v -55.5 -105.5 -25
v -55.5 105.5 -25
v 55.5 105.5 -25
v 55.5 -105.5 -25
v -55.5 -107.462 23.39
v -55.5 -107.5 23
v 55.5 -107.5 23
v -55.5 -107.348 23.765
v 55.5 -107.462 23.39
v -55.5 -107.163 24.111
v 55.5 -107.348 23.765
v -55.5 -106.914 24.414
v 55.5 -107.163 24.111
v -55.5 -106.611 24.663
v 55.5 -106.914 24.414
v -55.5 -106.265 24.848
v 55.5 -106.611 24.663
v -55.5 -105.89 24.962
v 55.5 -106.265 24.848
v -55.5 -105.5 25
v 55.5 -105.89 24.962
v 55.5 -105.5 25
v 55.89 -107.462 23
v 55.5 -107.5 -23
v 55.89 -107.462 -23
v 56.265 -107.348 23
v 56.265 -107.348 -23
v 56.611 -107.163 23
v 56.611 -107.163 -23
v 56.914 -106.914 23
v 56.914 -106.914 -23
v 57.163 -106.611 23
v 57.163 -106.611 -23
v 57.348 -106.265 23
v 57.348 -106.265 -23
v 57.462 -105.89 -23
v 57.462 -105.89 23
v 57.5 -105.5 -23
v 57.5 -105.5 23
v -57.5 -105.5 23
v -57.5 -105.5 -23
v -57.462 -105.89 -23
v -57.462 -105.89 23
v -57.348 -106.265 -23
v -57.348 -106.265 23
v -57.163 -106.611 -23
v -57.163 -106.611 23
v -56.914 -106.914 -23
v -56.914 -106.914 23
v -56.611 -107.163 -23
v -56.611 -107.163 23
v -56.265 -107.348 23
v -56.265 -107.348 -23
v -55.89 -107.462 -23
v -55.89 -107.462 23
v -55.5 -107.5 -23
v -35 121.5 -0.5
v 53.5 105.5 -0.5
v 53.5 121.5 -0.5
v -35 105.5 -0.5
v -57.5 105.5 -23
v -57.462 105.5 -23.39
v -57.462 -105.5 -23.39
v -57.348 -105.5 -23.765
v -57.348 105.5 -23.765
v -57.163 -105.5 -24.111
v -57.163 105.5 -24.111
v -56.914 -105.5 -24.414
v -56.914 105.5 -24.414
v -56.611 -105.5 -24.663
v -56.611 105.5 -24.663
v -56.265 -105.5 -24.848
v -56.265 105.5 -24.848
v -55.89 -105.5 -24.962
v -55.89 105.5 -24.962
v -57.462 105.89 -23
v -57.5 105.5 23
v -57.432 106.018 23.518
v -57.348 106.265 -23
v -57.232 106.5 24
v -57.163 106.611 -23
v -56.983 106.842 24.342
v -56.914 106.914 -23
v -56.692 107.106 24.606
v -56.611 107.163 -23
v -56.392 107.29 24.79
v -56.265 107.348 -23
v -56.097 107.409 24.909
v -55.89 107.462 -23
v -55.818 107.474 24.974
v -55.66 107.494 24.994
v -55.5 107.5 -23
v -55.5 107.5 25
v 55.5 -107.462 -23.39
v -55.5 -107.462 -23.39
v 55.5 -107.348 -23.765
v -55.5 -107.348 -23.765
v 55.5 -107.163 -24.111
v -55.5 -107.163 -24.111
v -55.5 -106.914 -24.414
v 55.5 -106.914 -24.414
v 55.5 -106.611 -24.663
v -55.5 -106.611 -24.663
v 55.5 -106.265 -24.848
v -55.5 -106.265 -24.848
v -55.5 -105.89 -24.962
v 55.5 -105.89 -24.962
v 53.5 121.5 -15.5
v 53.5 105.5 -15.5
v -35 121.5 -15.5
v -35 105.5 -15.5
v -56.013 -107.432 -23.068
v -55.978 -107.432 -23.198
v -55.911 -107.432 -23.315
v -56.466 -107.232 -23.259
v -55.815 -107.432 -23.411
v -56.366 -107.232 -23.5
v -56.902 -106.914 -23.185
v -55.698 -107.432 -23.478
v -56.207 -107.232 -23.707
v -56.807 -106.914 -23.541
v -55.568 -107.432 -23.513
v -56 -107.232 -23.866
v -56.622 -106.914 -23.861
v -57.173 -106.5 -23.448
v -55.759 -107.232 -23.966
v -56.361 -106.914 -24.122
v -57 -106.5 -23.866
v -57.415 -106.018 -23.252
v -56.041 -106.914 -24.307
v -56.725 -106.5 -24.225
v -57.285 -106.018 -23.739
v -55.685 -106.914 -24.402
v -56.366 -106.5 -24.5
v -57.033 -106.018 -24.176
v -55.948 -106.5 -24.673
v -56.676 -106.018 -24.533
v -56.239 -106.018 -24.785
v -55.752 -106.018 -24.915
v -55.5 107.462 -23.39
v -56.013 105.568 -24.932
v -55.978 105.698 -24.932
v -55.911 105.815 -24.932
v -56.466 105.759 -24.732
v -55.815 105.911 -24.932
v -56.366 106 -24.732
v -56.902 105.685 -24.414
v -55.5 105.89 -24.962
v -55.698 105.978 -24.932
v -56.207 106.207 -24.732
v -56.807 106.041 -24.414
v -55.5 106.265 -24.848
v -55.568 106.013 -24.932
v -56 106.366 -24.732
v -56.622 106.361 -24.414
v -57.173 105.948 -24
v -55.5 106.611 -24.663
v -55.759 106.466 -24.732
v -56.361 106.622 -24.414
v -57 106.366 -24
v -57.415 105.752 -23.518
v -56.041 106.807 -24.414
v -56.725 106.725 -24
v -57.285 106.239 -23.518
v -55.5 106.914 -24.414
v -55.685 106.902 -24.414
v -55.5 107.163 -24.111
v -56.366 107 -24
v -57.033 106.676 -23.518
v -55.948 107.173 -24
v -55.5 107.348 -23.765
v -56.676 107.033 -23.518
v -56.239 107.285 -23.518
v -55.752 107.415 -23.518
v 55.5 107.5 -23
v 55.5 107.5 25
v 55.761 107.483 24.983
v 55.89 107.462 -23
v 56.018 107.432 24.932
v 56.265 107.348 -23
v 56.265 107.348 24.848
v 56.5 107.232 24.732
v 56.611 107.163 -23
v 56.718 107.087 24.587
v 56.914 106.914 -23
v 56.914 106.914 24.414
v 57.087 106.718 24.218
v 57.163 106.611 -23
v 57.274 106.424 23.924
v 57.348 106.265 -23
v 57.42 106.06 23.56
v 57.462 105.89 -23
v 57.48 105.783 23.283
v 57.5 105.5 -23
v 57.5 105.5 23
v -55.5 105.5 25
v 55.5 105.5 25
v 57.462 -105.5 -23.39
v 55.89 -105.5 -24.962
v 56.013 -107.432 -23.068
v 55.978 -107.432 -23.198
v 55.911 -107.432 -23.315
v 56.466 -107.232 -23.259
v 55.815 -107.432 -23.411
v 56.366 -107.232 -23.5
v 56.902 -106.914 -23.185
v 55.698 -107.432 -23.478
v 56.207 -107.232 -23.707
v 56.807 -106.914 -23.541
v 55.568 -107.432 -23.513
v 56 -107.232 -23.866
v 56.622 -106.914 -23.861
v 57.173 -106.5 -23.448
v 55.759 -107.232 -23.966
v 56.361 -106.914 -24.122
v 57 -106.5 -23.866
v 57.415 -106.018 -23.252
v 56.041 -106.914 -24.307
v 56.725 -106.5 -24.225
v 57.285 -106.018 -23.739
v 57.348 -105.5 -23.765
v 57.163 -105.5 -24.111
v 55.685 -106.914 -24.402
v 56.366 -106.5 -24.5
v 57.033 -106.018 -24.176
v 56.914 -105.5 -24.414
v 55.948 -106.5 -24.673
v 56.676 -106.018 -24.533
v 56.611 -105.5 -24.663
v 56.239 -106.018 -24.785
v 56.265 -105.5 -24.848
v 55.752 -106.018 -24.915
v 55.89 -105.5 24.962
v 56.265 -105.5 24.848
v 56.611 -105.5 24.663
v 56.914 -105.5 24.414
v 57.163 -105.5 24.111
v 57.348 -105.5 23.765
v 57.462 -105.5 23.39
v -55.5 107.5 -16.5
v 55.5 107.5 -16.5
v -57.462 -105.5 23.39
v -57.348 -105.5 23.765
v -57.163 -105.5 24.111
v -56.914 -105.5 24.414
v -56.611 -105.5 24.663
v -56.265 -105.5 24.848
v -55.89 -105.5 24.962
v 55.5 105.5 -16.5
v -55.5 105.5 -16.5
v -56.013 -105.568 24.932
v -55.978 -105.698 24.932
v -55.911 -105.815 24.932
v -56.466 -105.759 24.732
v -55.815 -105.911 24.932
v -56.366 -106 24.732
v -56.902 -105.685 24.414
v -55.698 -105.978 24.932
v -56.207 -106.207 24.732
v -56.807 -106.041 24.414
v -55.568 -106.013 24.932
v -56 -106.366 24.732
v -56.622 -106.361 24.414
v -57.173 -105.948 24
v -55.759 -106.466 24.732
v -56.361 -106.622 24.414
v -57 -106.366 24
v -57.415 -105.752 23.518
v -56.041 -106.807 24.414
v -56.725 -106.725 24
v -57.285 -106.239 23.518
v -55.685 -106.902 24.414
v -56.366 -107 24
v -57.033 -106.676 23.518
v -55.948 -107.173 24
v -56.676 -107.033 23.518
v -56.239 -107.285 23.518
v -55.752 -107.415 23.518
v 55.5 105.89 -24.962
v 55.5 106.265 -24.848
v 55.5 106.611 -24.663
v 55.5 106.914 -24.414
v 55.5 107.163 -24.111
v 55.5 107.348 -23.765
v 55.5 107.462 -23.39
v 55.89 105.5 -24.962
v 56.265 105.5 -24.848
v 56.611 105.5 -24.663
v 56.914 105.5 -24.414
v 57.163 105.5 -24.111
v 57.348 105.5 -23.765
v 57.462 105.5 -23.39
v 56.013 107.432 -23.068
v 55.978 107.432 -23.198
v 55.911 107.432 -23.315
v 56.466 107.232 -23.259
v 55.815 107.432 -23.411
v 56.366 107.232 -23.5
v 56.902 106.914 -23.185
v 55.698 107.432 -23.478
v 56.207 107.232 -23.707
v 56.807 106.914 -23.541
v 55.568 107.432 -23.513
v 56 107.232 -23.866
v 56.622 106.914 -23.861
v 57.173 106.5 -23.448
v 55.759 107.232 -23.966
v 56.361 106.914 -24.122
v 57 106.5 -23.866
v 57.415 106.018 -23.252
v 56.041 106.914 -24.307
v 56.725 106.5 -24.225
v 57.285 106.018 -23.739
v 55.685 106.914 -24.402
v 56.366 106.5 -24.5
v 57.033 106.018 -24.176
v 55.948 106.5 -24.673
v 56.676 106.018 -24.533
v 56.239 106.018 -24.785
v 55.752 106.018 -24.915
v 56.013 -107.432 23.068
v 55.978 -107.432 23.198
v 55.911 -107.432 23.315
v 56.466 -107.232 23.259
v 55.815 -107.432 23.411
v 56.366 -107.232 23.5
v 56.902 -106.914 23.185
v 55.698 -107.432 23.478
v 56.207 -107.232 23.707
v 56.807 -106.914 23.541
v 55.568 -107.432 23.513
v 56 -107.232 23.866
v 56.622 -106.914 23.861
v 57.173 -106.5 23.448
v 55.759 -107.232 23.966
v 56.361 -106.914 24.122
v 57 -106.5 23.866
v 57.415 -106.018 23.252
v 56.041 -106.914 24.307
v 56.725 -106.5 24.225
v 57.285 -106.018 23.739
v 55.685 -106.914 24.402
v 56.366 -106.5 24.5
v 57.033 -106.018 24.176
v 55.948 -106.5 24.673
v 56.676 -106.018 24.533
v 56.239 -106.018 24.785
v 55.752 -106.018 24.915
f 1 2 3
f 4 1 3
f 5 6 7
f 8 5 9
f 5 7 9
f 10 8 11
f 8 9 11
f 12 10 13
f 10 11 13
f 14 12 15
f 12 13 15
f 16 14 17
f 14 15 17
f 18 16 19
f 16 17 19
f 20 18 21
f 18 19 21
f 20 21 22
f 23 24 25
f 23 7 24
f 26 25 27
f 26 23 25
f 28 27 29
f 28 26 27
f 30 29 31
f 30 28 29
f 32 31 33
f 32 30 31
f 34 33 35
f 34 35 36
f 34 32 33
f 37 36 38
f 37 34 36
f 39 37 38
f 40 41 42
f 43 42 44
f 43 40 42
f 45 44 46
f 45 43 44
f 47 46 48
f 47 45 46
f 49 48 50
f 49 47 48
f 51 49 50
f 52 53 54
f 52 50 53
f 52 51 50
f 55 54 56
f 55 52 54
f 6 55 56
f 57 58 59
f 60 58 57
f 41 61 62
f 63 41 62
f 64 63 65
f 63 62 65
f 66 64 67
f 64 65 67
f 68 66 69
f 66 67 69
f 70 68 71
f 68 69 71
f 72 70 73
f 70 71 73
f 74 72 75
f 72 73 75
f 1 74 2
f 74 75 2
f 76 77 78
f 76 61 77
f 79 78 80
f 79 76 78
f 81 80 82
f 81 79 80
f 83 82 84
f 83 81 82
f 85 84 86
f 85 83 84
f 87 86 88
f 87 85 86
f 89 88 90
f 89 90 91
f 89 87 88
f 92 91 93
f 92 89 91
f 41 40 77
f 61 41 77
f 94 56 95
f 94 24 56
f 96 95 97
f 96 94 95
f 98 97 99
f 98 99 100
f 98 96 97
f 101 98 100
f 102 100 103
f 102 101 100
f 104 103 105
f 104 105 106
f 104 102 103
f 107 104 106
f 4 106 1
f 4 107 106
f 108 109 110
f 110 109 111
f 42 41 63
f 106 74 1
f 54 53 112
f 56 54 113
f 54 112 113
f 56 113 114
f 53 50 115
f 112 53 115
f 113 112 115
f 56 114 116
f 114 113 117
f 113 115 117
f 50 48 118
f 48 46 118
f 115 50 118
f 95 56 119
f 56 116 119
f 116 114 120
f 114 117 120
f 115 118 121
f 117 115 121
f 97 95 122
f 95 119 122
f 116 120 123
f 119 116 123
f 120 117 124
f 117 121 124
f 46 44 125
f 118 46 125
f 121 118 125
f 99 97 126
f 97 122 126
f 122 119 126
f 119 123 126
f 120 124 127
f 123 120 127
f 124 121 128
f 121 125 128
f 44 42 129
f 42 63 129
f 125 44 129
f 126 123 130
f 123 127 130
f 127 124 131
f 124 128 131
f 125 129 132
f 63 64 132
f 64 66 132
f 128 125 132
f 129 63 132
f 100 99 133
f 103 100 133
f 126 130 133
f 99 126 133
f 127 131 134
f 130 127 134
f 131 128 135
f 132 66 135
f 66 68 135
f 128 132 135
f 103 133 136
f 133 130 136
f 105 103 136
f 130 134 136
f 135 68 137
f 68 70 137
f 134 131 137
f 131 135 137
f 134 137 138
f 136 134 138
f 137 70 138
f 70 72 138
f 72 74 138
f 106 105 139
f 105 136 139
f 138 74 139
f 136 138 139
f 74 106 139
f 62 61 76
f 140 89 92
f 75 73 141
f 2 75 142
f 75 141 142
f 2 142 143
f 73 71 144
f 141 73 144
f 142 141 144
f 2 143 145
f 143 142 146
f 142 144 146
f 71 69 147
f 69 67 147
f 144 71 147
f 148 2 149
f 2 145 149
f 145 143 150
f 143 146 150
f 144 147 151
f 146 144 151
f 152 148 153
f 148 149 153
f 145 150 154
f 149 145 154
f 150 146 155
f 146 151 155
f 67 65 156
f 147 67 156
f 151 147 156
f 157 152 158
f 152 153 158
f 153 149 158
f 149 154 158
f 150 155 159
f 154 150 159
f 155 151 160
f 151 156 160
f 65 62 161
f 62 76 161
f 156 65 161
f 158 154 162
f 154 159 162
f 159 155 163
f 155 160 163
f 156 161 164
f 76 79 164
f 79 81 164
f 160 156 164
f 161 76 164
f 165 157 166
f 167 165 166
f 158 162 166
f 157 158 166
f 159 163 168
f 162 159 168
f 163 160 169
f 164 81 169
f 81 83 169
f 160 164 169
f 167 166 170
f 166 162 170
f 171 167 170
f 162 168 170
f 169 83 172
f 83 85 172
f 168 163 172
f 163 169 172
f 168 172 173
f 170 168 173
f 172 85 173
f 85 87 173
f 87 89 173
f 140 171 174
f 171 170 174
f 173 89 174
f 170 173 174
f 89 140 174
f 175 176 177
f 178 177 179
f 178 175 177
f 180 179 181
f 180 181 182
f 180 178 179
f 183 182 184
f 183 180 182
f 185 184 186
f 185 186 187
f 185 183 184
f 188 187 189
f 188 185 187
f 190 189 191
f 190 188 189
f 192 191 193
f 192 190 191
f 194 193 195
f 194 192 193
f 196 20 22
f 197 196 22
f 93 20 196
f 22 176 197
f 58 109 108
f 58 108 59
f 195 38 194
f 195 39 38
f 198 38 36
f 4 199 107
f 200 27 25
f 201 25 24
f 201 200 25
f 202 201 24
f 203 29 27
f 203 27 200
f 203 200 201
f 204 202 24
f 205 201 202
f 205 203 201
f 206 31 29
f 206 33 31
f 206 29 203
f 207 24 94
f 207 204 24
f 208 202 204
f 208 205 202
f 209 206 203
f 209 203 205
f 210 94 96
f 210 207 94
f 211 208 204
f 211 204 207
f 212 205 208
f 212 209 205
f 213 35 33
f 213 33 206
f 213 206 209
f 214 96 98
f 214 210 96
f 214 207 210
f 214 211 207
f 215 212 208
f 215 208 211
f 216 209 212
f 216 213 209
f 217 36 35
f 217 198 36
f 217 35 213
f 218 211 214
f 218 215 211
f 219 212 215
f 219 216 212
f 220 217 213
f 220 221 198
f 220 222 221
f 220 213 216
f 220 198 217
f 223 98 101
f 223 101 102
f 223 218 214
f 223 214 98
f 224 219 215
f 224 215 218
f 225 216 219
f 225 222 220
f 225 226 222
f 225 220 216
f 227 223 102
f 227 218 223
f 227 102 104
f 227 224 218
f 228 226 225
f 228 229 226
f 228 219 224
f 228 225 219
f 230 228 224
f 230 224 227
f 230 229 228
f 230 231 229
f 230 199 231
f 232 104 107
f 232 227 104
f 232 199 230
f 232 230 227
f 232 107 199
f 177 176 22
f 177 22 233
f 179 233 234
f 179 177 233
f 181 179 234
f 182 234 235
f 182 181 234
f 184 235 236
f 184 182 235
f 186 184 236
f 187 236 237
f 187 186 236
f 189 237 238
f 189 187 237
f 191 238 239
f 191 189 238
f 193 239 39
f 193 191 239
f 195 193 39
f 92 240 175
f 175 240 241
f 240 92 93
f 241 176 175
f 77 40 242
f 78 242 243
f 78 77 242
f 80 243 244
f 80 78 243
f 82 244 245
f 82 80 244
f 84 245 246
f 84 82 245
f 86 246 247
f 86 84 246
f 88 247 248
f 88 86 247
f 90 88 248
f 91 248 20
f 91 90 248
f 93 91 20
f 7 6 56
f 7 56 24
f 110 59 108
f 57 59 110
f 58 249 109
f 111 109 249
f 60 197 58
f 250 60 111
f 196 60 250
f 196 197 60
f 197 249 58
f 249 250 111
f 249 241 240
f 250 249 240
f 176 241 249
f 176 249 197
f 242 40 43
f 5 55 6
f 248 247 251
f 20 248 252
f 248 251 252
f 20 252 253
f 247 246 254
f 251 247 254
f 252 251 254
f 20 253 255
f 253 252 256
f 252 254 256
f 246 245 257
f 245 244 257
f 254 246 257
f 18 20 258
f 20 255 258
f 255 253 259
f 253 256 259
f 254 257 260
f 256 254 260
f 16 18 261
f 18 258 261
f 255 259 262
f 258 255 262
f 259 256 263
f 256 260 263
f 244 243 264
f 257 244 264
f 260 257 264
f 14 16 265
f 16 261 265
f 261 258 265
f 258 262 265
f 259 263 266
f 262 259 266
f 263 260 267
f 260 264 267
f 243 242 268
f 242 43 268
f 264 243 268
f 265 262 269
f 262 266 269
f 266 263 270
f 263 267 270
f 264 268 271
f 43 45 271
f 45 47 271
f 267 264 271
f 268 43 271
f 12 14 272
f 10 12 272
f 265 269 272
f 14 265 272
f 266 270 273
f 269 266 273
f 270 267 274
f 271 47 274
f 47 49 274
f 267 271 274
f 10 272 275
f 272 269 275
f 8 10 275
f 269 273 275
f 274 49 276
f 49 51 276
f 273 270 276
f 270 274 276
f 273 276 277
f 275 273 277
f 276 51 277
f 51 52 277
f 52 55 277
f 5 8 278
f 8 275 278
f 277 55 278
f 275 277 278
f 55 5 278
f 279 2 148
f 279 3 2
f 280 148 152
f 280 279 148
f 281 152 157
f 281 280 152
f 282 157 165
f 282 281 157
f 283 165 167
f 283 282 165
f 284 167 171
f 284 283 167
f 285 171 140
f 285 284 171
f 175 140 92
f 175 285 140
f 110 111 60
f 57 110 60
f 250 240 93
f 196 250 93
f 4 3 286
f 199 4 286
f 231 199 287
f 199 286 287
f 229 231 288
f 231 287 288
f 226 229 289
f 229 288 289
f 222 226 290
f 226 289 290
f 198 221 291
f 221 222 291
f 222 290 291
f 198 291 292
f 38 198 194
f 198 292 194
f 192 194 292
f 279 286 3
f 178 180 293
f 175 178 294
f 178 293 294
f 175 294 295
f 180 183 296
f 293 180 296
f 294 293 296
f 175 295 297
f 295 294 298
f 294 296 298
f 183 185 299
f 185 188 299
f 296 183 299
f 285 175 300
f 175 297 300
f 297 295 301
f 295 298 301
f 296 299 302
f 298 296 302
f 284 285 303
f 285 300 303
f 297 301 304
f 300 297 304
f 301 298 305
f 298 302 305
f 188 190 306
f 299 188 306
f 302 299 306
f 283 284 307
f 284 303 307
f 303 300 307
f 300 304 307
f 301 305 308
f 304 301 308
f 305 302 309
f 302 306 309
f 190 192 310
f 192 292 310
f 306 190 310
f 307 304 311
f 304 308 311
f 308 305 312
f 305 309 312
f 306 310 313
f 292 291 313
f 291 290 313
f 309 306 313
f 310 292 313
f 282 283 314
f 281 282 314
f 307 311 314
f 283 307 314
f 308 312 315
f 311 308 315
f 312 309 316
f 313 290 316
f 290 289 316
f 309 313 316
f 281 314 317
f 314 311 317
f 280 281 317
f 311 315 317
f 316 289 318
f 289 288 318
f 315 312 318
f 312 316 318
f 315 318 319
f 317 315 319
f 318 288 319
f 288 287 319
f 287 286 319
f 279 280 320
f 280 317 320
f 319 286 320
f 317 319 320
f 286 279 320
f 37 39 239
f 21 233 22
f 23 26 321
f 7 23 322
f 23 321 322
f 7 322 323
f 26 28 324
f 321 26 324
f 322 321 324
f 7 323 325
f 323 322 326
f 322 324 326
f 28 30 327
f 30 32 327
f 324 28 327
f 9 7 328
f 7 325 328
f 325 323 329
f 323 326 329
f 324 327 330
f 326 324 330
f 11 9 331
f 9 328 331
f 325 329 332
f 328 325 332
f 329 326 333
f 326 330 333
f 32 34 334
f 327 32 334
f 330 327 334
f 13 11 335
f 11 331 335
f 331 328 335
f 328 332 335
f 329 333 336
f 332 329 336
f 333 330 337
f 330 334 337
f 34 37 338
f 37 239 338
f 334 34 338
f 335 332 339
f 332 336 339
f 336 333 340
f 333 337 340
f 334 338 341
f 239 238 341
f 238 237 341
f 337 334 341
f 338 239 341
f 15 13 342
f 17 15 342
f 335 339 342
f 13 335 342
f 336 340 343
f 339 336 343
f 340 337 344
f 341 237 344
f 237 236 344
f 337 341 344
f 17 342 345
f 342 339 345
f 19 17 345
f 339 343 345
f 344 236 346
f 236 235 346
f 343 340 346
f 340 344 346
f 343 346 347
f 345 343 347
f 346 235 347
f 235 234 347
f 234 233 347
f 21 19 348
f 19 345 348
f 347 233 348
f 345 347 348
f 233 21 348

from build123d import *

# Parameters (mm, degrees)
F0_W     = 115
F0_H     = 215
F1_DEPTH = 25
F2_W     = 111
F2_H     = 41.5
F3_DEPTH = 2
F4_W     = 88.5
F4_H     = 15
F5_DEPTH = 16
F6_R     = 1.99999


# Not quite as in the source:
# - a fillet or chamfer is up to 0.001 mm smaller than in the source, because OpenCascade refuses the exact size


with BuildPart() as f1:
    # F0 (on Top) → F1 (new body, symmetric)
    with BuildSketch(Plane.XY):
        Rectangle(F0_W, F0_H)
    extrude(amount=F1_DEPTH, both=True)

    # F2 (on face) → F3 (cut)
    with BuildSketch(Plane(origin=(0, 107.5, 0), x_dir=(-1, 0, 0), z_dir=(0, 1, 0))):
        with Locations((0, 4.25)):
            Rectangle(F2_W, F2_H)
    extrude(amount=-F3_DEPTH, mode=Mode.SUBTRACT)

    # F4 (on face) → F5 (join)
    with BuildSketch(Plane(origin=(0, 105.5, 0), x_dir=(-1, 0, 0), z_dir=(0, 1, 0))):
        with Locations((-9.25, -8)):
            Rectangle(F4_W, F4_H)
    extrude(amount=F5_DEPTH)

    # F6 (radius 2 in the source; OpenCascade refuses exactly that, so slightly less here)
    f6_edges = [f1.edges().sort_by_distance(p)[0] for p in [
        (-57.5, 107.5, 0),
        (-57.5, 0, -25),
        (-57.5, -107.5, 0),
        (-57.5, 0, 25),
        (57.5, 0, -25),
        (57.5, 107.5, 0),
        (57.5, 0, 25),
        (57.5, -107.5, 0),
        (0, 107.5, -25),
        (0, -107.5, -25),
        (0, -107.5, 25),
    ]]
    fillet(f6_edges, radius=F6_R)


solid = f1.part
